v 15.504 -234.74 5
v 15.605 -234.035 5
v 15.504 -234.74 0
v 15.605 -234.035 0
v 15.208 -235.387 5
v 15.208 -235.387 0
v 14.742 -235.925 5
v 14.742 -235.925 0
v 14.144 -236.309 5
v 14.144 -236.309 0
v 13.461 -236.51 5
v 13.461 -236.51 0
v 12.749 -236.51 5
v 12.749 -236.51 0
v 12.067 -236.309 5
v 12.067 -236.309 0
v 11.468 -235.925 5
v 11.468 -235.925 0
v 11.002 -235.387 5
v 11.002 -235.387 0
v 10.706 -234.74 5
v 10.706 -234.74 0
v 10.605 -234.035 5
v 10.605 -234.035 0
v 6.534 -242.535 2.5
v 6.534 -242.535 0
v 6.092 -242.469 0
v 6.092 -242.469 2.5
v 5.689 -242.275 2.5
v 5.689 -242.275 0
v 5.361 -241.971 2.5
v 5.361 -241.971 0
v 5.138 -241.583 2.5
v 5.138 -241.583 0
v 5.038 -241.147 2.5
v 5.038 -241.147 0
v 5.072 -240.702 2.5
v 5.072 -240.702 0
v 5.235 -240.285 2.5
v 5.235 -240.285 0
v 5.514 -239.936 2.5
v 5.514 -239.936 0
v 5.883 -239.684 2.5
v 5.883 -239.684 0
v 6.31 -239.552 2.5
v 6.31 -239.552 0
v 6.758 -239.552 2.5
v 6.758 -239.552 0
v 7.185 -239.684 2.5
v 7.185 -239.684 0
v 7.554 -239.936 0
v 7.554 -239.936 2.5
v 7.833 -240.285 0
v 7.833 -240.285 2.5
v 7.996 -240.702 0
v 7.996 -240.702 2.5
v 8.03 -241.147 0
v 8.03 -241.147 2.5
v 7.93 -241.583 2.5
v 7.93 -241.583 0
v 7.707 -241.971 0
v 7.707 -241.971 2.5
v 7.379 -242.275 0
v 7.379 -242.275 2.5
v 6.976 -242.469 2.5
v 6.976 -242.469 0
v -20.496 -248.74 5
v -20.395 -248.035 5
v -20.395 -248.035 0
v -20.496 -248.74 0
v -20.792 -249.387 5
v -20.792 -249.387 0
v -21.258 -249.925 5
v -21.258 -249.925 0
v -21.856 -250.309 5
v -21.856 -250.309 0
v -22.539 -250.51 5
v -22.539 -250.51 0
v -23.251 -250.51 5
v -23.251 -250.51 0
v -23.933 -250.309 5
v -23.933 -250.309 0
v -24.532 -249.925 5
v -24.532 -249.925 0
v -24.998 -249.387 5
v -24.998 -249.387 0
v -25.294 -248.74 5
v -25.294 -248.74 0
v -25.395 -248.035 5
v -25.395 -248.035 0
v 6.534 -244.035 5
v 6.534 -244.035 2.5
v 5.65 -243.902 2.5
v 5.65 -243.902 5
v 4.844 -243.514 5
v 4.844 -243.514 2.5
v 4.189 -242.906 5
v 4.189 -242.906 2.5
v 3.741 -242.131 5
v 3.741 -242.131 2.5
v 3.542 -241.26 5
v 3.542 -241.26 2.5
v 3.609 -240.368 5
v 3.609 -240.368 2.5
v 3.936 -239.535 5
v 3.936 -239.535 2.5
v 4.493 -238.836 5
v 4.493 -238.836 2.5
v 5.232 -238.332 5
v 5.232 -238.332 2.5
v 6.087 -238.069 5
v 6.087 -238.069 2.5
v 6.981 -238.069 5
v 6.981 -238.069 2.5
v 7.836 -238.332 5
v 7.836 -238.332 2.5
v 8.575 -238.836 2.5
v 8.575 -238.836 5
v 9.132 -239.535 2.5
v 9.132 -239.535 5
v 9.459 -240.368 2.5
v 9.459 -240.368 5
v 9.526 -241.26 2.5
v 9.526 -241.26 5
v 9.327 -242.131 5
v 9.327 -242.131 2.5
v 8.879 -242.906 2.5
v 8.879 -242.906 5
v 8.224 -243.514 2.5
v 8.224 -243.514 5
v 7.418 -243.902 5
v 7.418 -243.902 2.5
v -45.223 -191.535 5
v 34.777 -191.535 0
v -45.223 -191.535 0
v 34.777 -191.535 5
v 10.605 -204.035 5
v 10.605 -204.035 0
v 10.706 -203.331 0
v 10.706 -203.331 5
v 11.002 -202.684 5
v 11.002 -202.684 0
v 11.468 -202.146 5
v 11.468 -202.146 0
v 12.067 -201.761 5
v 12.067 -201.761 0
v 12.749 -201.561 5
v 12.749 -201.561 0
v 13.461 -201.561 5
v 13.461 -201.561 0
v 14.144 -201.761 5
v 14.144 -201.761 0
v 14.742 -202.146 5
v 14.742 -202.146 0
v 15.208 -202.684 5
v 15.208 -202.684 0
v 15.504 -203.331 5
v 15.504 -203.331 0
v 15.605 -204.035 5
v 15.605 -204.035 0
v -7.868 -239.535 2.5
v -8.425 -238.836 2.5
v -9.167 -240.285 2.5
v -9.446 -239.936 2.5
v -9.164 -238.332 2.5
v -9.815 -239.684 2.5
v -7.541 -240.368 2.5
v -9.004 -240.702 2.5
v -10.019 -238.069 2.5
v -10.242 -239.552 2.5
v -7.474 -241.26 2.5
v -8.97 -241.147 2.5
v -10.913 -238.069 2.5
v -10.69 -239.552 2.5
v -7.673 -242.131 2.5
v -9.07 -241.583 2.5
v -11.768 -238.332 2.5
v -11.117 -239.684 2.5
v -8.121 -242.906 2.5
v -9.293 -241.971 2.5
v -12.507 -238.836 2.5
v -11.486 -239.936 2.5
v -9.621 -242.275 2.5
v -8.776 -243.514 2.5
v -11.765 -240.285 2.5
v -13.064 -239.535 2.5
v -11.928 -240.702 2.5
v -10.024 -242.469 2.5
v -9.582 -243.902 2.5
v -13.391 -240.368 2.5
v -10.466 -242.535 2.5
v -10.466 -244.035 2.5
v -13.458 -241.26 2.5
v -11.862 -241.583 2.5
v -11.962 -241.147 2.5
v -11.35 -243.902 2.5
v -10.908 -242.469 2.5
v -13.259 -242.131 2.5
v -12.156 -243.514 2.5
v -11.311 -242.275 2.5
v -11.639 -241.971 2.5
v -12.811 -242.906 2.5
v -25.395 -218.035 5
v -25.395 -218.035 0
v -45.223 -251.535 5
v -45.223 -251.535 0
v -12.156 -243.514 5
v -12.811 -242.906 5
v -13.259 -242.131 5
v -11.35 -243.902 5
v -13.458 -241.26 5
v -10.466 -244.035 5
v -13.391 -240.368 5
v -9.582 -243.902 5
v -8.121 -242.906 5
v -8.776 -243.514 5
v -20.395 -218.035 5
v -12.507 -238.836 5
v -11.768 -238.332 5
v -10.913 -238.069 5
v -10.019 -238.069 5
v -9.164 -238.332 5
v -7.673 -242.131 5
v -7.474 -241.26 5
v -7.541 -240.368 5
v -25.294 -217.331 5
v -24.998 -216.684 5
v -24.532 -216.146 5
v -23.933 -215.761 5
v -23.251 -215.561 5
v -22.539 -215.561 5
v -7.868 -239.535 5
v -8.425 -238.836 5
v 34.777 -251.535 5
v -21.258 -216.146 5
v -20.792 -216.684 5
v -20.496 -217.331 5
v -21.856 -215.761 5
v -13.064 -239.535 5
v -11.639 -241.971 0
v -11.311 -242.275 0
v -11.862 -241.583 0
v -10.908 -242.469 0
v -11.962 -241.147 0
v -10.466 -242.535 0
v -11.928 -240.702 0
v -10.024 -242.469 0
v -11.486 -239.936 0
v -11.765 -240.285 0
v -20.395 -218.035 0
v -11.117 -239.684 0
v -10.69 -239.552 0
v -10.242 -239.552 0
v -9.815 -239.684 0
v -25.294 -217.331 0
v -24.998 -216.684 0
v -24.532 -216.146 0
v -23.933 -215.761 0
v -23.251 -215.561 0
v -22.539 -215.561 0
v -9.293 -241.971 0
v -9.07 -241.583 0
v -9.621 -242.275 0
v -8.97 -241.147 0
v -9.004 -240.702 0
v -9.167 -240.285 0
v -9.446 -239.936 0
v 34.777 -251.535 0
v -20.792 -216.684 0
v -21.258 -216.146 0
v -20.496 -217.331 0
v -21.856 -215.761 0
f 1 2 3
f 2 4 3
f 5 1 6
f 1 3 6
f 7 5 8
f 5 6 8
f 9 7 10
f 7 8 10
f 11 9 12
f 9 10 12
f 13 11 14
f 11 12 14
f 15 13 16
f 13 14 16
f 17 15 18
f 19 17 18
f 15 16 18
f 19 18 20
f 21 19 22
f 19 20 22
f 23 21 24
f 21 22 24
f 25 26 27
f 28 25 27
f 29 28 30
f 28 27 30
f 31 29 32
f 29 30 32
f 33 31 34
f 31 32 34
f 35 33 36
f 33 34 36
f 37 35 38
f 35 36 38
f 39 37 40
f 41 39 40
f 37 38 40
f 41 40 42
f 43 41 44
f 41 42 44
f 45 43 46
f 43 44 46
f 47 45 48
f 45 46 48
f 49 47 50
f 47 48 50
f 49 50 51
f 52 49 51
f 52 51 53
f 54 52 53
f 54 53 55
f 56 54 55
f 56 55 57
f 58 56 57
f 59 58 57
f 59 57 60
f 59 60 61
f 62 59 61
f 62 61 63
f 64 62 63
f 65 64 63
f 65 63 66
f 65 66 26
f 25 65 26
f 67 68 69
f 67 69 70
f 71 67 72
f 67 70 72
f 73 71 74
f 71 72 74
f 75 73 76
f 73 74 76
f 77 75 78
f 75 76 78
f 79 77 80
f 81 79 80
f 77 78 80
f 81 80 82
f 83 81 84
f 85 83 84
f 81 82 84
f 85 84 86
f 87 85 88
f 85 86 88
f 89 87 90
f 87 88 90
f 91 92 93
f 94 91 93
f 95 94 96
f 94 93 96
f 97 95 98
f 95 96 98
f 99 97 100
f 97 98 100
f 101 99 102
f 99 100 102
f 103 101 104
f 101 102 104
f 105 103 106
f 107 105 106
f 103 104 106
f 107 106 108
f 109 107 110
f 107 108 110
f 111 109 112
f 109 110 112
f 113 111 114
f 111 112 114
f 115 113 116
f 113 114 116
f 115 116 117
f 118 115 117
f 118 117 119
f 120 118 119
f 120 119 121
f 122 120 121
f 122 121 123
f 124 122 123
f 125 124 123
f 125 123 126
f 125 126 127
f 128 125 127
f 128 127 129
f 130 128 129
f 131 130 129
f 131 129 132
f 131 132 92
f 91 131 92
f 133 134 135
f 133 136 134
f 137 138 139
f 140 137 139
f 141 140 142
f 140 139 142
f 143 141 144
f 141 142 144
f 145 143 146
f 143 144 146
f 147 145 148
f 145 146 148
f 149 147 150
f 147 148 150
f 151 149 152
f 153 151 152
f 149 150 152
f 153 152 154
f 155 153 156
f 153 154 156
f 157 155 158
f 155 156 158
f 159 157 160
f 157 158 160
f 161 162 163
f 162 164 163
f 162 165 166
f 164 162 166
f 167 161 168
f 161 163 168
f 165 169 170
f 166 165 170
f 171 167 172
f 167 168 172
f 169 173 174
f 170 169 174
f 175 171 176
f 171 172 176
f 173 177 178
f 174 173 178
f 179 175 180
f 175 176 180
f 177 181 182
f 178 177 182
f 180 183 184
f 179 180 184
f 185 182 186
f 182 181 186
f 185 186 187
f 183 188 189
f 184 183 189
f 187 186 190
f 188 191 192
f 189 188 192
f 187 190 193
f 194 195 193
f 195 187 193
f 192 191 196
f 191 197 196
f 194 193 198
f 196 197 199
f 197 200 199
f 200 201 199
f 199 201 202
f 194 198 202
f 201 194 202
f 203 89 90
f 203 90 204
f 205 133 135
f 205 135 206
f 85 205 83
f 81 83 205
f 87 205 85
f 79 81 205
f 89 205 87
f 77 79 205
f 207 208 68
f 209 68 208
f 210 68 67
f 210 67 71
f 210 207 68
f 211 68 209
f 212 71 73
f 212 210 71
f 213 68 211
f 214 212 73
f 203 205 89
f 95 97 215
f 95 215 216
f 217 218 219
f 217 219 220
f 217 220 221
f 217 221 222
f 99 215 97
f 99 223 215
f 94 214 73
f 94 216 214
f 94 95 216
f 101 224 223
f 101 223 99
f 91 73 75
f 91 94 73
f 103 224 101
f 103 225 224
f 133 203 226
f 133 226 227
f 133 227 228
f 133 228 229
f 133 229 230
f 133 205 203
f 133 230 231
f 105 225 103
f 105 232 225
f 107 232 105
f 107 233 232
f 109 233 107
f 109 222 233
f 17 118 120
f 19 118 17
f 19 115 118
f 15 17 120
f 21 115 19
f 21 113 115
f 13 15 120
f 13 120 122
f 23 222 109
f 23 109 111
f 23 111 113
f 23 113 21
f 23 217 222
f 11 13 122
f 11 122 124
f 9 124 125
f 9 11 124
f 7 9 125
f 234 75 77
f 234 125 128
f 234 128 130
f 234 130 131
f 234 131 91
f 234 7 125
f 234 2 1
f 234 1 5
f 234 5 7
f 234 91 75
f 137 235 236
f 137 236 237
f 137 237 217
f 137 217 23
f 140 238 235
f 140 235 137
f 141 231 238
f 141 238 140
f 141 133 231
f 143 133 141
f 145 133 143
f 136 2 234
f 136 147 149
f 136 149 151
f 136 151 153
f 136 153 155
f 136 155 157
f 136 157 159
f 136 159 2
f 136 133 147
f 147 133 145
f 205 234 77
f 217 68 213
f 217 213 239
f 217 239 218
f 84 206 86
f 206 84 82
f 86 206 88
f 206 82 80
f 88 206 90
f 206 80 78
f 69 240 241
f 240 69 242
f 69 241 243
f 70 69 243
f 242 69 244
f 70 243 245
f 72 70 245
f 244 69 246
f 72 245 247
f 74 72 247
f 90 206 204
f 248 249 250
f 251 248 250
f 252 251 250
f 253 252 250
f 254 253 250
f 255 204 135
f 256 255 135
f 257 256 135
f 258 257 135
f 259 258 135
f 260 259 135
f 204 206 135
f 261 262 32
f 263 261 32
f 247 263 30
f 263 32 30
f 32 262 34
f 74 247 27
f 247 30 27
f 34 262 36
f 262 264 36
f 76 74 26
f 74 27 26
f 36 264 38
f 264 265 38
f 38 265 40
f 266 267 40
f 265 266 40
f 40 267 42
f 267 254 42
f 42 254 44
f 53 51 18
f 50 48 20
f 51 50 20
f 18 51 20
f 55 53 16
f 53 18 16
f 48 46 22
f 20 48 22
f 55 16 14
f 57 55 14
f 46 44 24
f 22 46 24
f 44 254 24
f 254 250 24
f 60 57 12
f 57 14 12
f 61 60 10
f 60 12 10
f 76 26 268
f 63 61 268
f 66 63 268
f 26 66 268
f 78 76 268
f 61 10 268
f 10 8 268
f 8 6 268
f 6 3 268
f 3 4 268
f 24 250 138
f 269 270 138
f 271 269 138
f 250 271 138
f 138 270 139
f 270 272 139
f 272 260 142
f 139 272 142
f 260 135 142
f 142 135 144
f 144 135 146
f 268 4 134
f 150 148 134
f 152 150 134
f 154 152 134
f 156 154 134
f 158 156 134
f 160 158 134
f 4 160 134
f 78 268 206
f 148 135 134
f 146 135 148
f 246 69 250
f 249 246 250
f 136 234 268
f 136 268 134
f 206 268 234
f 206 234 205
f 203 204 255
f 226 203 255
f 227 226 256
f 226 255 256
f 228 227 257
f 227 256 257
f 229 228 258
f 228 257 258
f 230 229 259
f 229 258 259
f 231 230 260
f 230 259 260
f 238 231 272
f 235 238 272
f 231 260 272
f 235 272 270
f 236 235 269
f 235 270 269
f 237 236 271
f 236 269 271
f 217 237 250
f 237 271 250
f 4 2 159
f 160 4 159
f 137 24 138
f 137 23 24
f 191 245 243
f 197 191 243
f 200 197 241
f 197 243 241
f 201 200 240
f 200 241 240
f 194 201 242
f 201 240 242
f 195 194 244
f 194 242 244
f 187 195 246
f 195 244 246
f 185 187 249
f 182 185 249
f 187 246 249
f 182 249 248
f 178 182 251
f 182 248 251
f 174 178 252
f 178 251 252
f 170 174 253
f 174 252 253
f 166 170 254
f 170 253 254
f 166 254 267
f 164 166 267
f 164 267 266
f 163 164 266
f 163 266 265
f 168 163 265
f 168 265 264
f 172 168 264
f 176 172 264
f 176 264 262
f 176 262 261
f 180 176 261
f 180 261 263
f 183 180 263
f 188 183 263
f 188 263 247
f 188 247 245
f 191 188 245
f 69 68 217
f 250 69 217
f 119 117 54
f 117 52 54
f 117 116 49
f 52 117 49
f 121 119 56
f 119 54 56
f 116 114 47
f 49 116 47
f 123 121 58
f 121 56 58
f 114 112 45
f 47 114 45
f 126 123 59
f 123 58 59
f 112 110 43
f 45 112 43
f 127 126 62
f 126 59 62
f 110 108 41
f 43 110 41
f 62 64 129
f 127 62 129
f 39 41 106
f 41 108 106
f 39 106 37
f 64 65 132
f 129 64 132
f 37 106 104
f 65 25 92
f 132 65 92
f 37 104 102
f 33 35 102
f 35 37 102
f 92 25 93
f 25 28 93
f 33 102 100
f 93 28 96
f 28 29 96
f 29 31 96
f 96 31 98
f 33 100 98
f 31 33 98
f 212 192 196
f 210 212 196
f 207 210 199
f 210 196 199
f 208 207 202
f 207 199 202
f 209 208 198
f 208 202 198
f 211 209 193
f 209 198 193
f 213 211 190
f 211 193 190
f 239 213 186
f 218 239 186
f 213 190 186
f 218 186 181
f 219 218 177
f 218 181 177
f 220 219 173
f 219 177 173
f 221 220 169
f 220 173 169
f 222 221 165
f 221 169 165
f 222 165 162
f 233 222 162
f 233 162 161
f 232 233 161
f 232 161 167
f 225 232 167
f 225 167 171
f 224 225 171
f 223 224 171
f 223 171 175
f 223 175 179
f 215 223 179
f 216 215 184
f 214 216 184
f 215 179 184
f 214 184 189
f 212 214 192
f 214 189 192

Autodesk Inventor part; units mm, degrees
ref_plane "YZ Plane" through (0, 0, 0) normal (1, 0, 0) x (0, 1, 0)
ref_plane "XZ Plane" through (0, 0, 0) normal (0, 1, 0) x (-1, 0, 0)
ref_plane "XY Plane" through (0, 0, 0) normal (0, 0, 1) x (1, 0, 0)
sketch "Sketch1" plane through (0, 0, 0) normal (0, 0, 1) x (1, 0, 0)
  line L0 (-401.966, 248.4646) -> (398.034, 248.4646)
  line L1 (398.034, 248.4646) -> (398.034, -251.5354)
  line L2 (398.034, -251.5354) -> (-401.966, -251.5354)
  line L3 (-401.966, -251.5354) -> (-401.966, 248.4646)
  dimension "d0" = 800
  dimension "d1" = 500
  dimension "d2" = 800
extrude "Extrusion1" add sketch "Sketch1" along normal blind 5
sketch "Sketch2" plane through (0, 0, 5) normal (0, 0, 1) x (1, 0, 0)
  point P0 (0, 0)
sketch "Sketch3" plane through (0, 0, 5) normal (0, 0, 1) x (1, 0, 0)
  line L0 (-401.966, -251.5354) -> (398.034, -251.5354) projected
  point P0 (0, 0)
sketch "Sketch4" plane through (0, 0, 5) normal (0, 0, 1) x (1, 0, 0)
  line L0 (-401.966, -251.5354) -> (398.034, -251.5354) projected
  line L1 (-1.966, -251.5354) -> (-1.966, -241.0354)
  line L2 (-1.966, -241.0354) -> (6.534, -241.0354)
  line L3 (-1.966, -241.0354) -> (-10.466, -241.0354)
  point P0 (0, 0)
  dimension "d7" = 10.5
  dimension "d8" = 8.5
  dimension "d9" = 8.5
hole "Hole1" at (6.534, -241.0354, 5) at (-10.466, -241.0354, 5) direction (0, 0, -1) diameter 3 depth 5 tip angle 118 counterbore diameter 6 counterbore depth 2.5
sketch "Sketch5" plane through (0, 0, 5) normal (0, 0, 1) x (1, 0, 0)
  point P0 (0, 0)
sketch "Sketch6" plane through (0, 0, 5) normal (0, 0, 1) x (1, 0, 0)
  line L0 (398.034, -251.5354) -> (-401.966, -251.5354) projected
  line L1 (6.5526, -251.5354) -> (6.5526, -248.0354)
  line L2 (0, -251.5354) -> (3.5, -251.5354) construction
  line L3 (-4.8949, -248.0354) -> (13.1051, -248.0354)
  line L4 (-4.8949, -248.0354) -> (-22.8949, -248.0354)
  line L5 (13.1051, -248.0354) -> (13.1051, -234.0354)
  circle A0 centre (-10.466, -241.0354) radius 1.5 projected
  line L6 (-10.466, -241.0354) -> (-16.966, -241.0354)
  line L7 (6.5526, -241.0354) -> (13.0526, -241.0354)
  line L8 (-22.8949, -248.0354) -> (-20.3949, -248.0354)
  line L9 (-20.3949, -248.0354) -> (-20.3949, -218.0354)
  line L10 (-20.3949, -218.0354) -> (-22.8949, -218.0354)
  line L11 (-22.8949, -218.0354) -> (-22.8949, -248.0354)
  line L12 (-22.8949, -248.0354) -> (-25.3949, -248.0354)
  line L13 (-25.3949, -248.0354) -> (-25.3949, -218.0354)
  line L14 (-25.3949, -218.0354) -> (-22.8949, -218.0354)
  line L15 (-22.8949, -218.0354) -> (-22.8949, -248.0354)
  line L16 (13.1051, -234.0354) -> (15.6051, -234.0354)
  line L17 (15.6051, -234.0354) -> (15.6051, -204.0354)
  line L18 (15.6051, -204.0354) -> (13.1051, -204.0354)
  line L19 (13.1051, -204.0354) -> (13.1051, -234.0354)
  line L20 (13.1051, -234.0354) -> (10.6051, -234.0354)
  line L21 (10.6051, -234.0354) -> (10.6051, -204.0354)
  line L22 (10.6051, -204.0354) -> (13.1051, -204.0354)
  line L23 (13.1051, -204.0354) -> (13.1051, -234.0354)
  point P0 (0, 0)
  dimension "d17" = 3.5
  dimension "d18" = 90
  dimension "d19" = 18
  dimension "d20" = 18
  dimension "d21" = 14
  dimension "d22" = 6.5
  dimension "d23" = 6.5
  dimension "d24" = 2.5
  dimension "d25" = 30
  dimension "d26" = 2.5
  dimension "d27" = 2.5
  dimension "d28" = 30
  dimension "d29" = 2.5
  dimension "d30" = 30
  dimension "d52" = 36
  dimension "d53" = 17.0186
sketch "Sketch7" plane through (0, 0, 0) normal (0, 0, -1) x (-1, 0, 0)
  point P0 (0, 0)
hole "Hole2" at (-22.8949, -248.0354, 5) at (13.1051, -234.0354, 5) direction (0, 0, -1) diameter 5 depth 15 tip angle 118
extrude "Extrusion2" cut sketch "Sketch6" against normal blind 15 contours L20 L21 L22 L19 | L19 L18 L17 L16 | L4 L11 L10 L9 | L12 L13 L14 L11
hole "Hole3" at (-22.8949, -218.0354, 5) at (13.1051, -204.0354, 5) direction (0, 0, -1) diameter 5 depth 15 tip angle 118
sketch "Sketch8" plane through (0, 0, 5) normal (0, 0, 1) x (1, 0, 0)
  line L0 (398.034, -251.5354) -> (-401.966, -251.5354) projected
  line L1 (-45.2231, -251.5354) -> (34.7769, -251.5354)
  line L2 (34.7769, -251.5354) -> (34.7769, -191.5354)
  line L3 (34.7769, -191.5354) -> (-45.2231, -191.5354)
  line L4 (-45.2231, -191.5354) -> (-45.2231, -251.5354)
  line L5 (-45.2231, 276.0506) -> (-471.5877, 276.0506)
  line L6 (-471.5877, 276.0506) -> (-471.5877, -297.567)
  line L7 (-471.5877, -297.567) -> (-45.2231, -297.567)
  line L8 (-45.2231, -297.567) -> (-45.2231, 276.0506)
  line L9 (-45.2231, -191.5354) -> (471.8148, -191.5354)
  line L10 (471.8148, -191.5354) -> (471.8148, 308.5195)
  line L11 (471.8148, 308.5195) -> (-45.2231, 308.5195)
  line L12 (-45.2231, 308.5195) -> (-45.2231, -191.5354)
  line L13 (34.7769, -191.5354) -> (471.8148, -191.5354)
  line L14 (471.8148, -191.5354) -> (471.8148, -324.6244)
  line L15 (471.8148, -324.6244) -> (34.7769, -324.6244)
  line L16 (34.7769, -324.6244) -> (34.7769, -191.5354)
  point P0 (0, 0)
  dimension "d48" = 80
  dimension "d49" = 60
extrude "Extrusion3" cut sketch "Sketch8" against normal blind 15 contours L2 L9 L14 L15 L16 | L8 L7 L6 L5 L4 | L3 L8 L12 L11 L10 L9
properties part number "regla_digital"
